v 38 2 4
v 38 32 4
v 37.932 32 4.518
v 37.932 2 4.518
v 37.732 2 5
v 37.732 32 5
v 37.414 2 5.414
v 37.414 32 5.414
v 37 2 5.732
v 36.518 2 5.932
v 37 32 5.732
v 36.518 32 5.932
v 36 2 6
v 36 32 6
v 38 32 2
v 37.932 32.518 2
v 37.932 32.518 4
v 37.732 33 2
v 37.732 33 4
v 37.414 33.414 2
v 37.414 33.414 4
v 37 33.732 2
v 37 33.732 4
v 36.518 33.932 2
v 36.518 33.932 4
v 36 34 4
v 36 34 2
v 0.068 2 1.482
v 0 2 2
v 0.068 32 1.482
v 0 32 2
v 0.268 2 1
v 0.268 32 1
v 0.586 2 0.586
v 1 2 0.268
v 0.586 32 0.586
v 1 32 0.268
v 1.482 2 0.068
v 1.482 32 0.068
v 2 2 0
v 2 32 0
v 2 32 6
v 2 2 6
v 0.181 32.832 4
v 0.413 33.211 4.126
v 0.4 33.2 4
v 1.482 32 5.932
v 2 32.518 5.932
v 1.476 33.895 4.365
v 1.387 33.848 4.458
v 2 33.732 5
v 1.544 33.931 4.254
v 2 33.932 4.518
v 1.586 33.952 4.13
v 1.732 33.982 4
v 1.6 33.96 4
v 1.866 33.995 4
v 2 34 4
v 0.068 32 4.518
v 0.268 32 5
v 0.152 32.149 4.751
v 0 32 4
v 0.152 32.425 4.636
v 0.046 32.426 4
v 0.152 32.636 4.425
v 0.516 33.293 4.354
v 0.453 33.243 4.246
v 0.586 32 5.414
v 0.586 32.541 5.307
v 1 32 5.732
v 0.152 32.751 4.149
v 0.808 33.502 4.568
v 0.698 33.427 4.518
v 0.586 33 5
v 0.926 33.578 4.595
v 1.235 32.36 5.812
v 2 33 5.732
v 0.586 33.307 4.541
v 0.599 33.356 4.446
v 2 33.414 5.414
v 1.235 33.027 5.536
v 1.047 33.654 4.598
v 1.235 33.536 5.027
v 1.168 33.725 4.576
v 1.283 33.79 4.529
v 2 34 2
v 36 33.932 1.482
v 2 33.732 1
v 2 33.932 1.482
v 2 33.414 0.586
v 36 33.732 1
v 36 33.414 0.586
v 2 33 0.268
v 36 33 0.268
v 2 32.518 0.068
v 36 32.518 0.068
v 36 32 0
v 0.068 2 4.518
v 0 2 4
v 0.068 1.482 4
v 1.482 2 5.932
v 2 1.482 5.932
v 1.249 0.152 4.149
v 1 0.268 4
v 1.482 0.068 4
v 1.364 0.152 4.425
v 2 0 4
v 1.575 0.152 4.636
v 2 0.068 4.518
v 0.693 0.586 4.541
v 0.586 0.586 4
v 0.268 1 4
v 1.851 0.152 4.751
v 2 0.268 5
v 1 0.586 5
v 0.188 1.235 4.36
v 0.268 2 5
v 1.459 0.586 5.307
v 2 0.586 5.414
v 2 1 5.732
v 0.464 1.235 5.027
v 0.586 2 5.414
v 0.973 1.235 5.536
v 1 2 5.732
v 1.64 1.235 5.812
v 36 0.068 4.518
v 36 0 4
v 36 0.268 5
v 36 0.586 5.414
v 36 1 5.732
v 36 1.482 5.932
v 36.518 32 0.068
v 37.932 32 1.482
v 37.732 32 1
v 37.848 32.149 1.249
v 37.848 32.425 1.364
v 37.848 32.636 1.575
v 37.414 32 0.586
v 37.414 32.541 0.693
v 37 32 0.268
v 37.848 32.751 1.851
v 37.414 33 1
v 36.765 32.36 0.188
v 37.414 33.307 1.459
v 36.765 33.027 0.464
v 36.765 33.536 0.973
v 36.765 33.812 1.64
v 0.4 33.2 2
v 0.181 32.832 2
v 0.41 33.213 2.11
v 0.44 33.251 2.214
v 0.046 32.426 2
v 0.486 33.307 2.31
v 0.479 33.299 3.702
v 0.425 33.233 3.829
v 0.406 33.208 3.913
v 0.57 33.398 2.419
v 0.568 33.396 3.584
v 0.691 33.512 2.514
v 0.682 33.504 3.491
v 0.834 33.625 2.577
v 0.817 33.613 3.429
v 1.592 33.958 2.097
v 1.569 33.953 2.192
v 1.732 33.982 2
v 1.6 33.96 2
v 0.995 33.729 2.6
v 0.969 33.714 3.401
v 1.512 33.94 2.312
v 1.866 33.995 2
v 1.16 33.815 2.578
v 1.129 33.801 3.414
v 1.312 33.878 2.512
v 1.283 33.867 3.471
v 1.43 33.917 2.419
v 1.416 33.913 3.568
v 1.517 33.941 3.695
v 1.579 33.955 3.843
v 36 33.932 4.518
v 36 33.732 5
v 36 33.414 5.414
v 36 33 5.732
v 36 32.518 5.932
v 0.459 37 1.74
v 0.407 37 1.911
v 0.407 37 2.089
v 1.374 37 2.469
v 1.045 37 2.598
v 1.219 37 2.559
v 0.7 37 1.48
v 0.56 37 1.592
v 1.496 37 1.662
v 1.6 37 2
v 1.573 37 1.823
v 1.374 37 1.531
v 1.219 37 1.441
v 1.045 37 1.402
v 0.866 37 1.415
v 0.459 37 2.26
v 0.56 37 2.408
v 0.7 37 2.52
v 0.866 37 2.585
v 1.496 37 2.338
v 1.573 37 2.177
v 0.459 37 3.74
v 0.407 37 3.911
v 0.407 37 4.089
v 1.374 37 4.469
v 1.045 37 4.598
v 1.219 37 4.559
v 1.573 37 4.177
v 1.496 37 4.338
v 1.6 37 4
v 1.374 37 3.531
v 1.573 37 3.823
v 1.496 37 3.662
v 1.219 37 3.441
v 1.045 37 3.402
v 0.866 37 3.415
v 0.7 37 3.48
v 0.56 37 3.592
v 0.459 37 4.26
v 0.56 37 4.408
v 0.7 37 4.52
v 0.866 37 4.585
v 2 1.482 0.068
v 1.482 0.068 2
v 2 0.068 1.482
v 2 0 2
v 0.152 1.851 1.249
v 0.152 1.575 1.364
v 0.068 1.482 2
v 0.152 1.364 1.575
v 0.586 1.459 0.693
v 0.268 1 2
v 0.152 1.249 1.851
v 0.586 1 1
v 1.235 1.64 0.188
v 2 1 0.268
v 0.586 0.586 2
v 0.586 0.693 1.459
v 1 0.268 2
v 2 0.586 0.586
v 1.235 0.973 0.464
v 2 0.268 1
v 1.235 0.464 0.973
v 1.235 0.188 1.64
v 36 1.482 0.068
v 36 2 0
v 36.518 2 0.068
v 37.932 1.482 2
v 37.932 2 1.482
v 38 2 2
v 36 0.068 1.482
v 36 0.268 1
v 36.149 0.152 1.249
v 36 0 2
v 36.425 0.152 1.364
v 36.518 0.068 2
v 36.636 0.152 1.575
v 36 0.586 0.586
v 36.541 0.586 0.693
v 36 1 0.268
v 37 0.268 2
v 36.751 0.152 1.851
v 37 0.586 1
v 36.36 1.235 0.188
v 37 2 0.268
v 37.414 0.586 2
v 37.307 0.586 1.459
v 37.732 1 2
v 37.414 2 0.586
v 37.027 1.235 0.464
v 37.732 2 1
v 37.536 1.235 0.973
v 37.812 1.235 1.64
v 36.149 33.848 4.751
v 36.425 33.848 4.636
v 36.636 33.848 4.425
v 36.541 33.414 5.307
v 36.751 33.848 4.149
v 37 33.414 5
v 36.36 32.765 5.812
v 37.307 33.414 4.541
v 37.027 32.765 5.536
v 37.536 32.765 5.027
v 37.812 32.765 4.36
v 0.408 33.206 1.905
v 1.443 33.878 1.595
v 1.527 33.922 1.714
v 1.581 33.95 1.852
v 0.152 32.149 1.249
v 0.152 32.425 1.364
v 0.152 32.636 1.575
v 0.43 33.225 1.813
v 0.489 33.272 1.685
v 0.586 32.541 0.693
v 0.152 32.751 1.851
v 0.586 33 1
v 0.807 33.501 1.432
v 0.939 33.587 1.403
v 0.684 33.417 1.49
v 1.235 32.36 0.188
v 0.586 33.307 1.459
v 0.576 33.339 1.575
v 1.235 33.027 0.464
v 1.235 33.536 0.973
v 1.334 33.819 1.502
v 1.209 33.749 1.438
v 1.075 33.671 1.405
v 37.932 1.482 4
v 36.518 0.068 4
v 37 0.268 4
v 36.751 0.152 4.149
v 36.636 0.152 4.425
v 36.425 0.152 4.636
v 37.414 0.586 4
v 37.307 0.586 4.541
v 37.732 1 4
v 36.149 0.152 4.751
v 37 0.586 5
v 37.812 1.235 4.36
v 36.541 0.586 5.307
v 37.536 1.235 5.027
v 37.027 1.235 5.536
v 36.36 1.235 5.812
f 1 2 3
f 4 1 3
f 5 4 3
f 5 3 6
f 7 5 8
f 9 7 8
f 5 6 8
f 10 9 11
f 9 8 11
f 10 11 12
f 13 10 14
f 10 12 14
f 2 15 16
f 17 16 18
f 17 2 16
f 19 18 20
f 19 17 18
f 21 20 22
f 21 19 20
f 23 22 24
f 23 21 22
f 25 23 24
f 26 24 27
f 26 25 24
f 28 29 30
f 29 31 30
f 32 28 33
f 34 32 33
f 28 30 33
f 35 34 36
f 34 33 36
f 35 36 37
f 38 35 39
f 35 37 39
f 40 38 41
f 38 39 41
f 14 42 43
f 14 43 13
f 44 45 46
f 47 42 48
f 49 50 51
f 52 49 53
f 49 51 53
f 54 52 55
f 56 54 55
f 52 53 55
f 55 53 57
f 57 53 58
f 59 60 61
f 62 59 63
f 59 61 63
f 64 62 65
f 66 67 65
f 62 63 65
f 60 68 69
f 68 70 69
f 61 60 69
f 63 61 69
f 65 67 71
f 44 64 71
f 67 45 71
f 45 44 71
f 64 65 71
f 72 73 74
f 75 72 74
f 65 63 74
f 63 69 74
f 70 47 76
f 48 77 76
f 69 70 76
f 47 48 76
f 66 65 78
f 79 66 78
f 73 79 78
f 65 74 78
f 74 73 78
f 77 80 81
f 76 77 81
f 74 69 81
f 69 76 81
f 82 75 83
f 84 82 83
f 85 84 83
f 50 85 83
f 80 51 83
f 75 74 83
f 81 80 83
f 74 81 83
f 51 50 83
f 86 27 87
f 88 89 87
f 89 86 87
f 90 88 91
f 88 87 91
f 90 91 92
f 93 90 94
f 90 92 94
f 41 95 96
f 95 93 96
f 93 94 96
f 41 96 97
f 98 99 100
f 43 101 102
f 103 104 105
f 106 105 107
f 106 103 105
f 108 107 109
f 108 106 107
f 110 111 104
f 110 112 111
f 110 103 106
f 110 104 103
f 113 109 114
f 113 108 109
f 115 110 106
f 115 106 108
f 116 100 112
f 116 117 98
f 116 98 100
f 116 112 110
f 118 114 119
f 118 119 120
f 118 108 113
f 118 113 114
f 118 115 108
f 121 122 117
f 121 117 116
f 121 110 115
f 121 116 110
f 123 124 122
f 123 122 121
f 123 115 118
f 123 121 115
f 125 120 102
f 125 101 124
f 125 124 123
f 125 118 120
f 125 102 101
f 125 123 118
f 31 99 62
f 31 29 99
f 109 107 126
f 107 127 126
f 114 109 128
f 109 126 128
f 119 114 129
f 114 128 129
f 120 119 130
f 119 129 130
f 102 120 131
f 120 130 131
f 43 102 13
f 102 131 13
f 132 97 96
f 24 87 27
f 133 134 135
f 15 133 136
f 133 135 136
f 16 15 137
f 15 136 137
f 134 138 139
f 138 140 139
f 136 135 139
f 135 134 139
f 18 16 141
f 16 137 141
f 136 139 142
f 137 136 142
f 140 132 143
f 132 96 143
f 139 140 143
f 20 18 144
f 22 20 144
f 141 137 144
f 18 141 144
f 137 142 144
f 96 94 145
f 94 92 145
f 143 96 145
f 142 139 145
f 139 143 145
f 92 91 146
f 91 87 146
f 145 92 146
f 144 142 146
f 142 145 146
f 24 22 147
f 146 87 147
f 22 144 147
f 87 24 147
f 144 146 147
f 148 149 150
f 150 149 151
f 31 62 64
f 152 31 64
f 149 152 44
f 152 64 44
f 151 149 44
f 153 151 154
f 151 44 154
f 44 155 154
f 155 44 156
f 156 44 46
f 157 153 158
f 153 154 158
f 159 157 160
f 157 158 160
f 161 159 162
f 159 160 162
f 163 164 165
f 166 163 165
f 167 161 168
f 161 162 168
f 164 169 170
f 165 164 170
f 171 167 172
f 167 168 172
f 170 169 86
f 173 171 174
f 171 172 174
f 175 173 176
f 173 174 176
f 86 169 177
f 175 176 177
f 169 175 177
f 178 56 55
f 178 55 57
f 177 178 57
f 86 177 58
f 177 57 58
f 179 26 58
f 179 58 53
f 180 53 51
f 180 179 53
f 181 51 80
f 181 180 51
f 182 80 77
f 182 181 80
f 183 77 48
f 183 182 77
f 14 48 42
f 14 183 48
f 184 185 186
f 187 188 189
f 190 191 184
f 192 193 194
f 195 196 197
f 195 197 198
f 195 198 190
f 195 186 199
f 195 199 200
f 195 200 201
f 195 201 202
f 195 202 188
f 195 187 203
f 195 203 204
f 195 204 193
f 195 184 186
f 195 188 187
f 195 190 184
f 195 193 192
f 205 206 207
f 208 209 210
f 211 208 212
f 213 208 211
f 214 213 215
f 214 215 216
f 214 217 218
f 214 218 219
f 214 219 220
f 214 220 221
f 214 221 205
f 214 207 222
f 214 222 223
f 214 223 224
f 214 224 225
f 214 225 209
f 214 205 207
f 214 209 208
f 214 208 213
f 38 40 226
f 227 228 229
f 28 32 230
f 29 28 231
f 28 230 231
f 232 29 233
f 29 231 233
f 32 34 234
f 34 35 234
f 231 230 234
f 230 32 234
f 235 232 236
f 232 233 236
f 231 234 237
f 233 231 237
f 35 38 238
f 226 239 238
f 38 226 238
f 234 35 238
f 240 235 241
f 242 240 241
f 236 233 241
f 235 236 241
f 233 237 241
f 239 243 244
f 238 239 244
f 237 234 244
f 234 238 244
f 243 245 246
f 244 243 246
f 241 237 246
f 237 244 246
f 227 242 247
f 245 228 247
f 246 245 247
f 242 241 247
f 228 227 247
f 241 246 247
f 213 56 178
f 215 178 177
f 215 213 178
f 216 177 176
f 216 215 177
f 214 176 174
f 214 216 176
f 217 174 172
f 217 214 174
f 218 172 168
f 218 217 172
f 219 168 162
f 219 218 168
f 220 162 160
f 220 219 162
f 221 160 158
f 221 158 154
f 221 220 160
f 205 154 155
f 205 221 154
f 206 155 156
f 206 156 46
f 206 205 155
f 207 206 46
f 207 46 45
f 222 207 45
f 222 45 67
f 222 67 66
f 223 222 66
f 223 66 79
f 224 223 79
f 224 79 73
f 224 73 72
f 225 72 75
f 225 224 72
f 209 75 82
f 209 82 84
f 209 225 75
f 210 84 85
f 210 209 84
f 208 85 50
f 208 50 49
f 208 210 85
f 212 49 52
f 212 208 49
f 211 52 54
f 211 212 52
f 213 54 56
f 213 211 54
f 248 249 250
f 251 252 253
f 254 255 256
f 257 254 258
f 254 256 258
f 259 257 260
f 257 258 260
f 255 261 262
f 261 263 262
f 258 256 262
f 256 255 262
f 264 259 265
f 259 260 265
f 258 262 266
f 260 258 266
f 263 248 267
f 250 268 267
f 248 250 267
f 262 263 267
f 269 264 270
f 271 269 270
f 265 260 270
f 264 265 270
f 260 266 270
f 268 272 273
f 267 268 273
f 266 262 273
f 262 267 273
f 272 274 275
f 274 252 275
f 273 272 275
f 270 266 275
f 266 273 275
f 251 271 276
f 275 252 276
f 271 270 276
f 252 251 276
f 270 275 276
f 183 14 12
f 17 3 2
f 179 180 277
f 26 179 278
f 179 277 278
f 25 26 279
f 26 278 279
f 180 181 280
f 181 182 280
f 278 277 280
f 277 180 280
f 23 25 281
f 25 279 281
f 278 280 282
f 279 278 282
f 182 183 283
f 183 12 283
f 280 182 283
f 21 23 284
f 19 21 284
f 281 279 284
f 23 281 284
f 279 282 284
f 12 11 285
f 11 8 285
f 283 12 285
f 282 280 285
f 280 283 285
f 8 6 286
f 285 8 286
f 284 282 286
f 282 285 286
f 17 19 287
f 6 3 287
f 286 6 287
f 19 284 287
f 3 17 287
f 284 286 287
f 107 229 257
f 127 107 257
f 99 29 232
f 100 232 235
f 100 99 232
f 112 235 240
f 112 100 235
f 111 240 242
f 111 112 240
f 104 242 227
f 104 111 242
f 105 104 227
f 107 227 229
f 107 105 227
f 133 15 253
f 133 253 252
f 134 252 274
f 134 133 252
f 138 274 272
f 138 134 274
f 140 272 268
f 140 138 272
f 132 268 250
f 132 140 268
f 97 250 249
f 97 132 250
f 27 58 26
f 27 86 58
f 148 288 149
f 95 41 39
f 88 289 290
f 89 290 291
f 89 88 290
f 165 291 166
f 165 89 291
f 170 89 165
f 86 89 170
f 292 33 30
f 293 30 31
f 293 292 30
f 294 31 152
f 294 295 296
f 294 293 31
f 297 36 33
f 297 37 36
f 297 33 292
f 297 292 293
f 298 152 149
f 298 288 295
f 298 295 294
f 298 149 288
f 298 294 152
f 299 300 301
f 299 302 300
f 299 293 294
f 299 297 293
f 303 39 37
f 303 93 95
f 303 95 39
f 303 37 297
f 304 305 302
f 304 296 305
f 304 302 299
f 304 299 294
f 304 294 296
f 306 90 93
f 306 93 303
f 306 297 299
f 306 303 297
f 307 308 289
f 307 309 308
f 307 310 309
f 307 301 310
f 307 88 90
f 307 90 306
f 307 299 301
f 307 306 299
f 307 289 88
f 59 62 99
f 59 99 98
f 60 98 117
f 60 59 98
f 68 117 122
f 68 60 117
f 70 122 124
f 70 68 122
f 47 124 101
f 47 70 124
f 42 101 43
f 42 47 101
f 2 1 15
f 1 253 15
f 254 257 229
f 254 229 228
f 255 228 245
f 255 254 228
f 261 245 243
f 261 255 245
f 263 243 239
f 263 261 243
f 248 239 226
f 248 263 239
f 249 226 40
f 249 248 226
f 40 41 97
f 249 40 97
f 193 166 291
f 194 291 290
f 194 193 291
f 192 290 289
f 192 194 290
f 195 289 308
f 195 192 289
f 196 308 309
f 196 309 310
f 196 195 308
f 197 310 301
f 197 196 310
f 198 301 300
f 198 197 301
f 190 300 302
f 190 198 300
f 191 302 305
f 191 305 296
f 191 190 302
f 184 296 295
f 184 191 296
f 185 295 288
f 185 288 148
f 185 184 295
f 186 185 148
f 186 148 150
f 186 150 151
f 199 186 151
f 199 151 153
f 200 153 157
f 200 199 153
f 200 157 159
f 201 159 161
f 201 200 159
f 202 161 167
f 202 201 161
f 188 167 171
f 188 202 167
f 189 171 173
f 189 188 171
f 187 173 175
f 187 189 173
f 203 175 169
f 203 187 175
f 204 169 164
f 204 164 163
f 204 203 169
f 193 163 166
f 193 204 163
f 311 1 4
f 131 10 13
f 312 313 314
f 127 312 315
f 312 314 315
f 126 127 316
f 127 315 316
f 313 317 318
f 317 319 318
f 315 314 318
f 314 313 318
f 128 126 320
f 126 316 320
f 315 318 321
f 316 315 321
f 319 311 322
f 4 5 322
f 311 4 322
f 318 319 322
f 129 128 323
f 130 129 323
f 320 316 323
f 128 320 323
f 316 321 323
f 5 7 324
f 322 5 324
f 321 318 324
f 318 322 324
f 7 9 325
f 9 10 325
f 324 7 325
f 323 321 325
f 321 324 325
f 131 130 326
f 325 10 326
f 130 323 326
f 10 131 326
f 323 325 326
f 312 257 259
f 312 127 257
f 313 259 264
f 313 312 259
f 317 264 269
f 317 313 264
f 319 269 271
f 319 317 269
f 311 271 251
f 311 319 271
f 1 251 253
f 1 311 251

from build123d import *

# Parameters (mm, degrees)
ESQUISSE1_W             = 38
ESQUISSE1_H             = 34
BOSS_EXTRU_1_DEPTH      = 6
CONG_2_R                = 2
ESQUISSE2_R             = 0.6
BOSS_EXTRU_2_DEPTH      = 3
BOSS_EXTRU_2_DEPTH_BACK = 6


with BuildPart() as part:
    # Esquisse1 → Boss.-Extru.1 (new body)
    with BuildSketch(Plane.XY):
        with Locations((19, 17)):
            Rectangle(ESQUISSE1_W, ESQUISSE1_H)
    extrude(amount=BOSS_EXTRU_1_DEPTH)

    # Congé2
    cong_2_edges = [part.edges().sort_by_distance(p)[0] for p in [
        (38, 17, 6),
        (19, 34, 6),
        (0, 17, 6),
        (19, 34, 0),
        (38, 17, 0),
        (19, 0, 0),
        (0, 17, 0),
        (0, 34, 3),
        (38, 34, 3),
        (38, 0, 3),
        (0, 0, 3),
        (19, 0, 6),
    ]]
    fillet(cong_2_edges, radius=CONG_2_R)

    # Esquisse2 → Boss.-Extru.2 (add, two sides)
    with BuildSketch(Plane(origin=(0, 34, 0), x_dir=(1, 0, 0), z_dir=(0, 1, 0))) as boss_extru_2_sk:
        with Locations((1, -2)):
            Circle(ESQUISSE2_R)
        with Locations((1, -4)):
            Circle(ESQUISSE2_R)
    extrude(amount=BOSS_EXTRU_2_DEPTH)
    extrude(boss_extru_2_sk.sketch, amount=-BOSS_EXTRU_2_DEPTH_BACK)


solid = part.part
